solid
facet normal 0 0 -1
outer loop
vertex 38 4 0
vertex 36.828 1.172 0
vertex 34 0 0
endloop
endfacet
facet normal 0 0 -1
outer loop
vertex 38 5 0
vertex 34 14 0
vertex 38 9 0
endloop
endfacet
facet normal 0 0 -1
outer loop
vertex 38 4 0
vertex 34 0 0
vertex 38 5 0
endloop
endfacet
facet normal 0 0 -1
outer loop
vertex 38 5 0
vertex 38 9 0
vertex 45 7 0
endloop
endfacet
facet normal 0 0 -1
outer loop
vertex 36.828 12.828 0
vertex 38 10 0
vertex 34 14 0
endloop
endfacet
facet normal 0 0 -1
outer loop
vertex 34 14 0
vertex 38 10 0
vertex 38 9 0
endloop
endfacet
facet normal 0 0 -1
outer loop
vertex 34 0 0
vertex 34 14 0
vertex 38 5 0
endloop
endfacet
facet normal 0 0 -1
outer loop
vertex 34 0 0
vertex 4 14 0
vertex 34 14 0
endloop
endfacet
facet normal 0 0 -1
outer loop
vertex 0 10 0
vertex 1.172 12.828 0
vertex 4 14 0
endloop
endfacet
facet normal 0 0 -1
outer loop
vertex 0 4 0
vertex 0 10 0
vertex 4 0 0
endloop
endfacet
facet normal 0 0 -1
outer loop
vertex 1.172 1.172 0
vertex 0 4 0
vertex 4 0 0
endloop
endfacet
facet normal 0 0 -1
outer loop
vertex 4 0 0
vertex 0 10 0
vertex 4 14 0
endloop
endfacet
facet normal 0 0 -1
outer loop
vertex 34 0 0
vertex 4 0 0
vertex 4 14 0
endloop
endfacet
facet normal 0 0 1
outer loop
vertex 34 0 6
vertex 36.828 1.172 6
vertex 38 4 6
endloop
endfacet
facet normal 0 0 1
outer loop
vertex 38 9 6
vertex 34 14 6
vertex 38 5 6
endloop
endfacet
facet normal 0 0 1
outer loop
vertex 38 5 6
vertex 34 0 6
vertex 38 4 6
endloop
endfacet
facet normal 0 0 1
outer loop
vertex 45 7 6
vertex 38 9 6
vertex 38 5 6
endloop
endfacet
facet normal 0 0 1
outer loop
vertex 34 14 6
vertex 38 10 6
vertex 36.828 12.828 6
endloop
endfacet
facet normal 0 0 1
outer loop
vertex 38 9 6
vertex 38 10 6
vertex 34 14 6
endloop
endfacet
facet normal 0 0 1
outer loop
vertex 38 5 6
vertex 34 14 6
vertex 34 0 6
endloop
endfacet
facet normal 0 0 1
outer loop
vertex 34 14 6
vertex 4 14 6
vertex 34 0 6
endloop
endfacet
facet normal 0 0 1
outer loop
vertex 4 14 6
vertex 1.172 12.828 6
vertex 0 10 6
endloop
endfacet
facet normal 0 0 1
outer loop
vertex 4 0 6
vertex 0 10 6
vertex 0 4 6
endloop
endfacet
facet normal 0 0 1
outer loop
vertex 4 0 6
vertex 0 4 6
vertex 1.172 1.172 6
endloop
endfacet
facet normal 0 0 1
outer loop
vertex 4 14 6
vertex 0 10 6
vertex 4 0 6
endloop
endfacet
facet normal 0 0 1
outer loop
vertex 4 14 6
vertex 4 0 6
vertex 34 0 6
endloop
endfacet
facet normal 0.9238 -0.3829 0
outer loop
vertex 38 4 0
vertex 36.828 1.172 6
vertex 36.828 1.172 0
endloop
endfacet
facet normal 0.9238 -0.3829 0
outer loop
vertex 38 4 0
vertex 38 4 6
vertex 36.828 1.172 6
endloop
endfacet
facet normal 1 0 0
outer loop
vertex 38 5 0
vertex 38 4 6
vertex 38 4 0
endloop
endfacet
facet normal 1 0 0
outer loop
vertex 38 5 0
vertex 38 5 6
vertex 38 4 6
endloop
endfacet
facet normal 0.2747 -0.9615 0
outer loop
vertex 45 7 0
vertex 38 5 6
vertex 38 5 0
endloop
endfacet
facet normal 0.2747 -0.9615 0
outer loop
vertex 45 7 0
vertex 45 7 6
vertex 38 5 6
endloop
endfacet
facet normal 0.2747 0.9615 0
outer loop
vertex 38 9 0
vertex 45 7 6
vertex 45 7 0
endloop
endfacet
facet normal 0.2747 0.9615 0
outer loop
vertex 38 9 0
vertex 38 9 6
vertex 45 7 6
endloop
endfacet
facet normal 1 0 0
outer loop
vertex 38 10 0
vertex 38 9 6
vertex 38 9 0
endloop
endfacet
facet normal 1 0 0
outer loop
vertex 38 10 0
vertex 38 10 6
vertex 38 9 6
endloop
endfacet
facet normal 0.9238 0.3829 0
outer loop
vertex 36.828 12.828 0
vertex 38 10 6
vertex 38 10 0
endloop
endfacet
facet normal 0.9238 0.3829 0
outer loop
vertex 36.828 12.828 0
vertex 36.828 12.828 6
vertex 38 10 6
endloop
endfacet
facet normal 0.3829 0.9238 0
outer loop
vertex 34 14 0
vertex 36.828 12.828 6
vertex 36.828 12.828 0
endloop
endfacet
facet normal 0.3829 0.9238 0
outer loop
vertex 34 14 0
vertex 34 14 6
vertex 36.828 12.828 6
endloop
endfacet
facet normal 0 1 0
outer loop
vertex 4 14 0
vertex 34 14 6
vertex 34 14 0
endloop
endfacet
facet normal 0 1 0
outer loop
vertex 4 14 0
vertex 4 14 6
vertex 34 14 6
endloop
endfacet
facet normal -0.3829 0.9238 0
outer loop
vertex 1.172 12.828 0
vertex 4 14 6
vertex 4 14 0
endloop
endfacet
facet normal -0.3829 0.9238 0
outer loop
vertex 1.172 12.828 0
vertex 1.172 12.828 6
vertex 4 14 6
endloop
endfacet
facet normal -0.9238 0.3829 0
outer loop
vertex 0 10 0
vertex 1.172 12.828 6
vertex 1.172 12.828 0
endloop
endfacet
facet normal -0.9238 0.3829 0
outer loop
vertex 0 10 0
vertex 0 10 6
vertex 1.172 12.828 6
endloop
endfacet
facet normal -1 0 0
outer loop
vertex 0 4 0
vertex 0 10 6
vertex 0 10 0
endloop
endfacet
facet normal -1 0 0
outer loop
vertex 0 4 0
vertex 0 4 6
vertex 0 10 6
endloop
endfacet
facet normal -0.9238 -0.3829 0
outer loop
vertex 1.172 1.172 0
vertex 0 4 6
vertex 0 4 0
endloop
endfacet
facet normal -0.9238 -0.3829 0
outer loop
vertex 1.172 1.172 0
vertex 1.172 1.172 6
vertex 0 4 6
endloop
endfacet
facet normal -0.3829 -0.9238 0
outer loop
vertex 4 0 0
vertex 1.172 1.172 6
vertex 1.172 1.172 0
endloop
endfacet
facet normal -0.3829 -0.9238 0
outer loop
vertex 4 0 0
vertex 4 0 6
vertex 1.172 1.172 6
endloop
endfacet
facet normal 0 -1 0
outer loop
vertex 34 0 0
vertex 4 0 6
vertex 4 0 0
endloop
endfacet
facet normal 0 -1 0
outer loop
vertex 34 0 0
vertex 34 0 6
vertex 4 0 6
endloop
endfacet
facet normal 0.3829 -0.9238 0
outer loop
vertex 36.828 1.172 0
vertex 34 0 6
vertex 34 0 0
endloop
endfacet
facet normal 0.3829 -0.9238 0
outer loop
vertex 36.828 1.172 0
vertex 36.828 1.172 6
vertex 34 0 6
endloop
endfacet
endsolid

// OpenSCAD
$fn = 32;

// ----------------------------------------------------------------------
// Ratchet pawl: 38 x 14 mm body, beak 7 mm с правого торца
// ----------------------------------------------------------------------

// --- parameters (mm) ---
profile_height = 6;       // extrusion height
profile_points = 15;      // points of the closed outline

profile = [[0, 4], [1.172, 1.172], [4, 0], [34, 0], [36.828, 1.172], [38, 4], [38, 5], [45, 7], [38, 9], [38, 10], [36.828, 12.828], [34, 14], [4, 14], [1.172, 12.828], [0, 10]];  // single closed polygon, 15 points, counter clockwise

// --- the one profile operation ---
linear_extrude(height = profile_height) polygon(points = profile);
